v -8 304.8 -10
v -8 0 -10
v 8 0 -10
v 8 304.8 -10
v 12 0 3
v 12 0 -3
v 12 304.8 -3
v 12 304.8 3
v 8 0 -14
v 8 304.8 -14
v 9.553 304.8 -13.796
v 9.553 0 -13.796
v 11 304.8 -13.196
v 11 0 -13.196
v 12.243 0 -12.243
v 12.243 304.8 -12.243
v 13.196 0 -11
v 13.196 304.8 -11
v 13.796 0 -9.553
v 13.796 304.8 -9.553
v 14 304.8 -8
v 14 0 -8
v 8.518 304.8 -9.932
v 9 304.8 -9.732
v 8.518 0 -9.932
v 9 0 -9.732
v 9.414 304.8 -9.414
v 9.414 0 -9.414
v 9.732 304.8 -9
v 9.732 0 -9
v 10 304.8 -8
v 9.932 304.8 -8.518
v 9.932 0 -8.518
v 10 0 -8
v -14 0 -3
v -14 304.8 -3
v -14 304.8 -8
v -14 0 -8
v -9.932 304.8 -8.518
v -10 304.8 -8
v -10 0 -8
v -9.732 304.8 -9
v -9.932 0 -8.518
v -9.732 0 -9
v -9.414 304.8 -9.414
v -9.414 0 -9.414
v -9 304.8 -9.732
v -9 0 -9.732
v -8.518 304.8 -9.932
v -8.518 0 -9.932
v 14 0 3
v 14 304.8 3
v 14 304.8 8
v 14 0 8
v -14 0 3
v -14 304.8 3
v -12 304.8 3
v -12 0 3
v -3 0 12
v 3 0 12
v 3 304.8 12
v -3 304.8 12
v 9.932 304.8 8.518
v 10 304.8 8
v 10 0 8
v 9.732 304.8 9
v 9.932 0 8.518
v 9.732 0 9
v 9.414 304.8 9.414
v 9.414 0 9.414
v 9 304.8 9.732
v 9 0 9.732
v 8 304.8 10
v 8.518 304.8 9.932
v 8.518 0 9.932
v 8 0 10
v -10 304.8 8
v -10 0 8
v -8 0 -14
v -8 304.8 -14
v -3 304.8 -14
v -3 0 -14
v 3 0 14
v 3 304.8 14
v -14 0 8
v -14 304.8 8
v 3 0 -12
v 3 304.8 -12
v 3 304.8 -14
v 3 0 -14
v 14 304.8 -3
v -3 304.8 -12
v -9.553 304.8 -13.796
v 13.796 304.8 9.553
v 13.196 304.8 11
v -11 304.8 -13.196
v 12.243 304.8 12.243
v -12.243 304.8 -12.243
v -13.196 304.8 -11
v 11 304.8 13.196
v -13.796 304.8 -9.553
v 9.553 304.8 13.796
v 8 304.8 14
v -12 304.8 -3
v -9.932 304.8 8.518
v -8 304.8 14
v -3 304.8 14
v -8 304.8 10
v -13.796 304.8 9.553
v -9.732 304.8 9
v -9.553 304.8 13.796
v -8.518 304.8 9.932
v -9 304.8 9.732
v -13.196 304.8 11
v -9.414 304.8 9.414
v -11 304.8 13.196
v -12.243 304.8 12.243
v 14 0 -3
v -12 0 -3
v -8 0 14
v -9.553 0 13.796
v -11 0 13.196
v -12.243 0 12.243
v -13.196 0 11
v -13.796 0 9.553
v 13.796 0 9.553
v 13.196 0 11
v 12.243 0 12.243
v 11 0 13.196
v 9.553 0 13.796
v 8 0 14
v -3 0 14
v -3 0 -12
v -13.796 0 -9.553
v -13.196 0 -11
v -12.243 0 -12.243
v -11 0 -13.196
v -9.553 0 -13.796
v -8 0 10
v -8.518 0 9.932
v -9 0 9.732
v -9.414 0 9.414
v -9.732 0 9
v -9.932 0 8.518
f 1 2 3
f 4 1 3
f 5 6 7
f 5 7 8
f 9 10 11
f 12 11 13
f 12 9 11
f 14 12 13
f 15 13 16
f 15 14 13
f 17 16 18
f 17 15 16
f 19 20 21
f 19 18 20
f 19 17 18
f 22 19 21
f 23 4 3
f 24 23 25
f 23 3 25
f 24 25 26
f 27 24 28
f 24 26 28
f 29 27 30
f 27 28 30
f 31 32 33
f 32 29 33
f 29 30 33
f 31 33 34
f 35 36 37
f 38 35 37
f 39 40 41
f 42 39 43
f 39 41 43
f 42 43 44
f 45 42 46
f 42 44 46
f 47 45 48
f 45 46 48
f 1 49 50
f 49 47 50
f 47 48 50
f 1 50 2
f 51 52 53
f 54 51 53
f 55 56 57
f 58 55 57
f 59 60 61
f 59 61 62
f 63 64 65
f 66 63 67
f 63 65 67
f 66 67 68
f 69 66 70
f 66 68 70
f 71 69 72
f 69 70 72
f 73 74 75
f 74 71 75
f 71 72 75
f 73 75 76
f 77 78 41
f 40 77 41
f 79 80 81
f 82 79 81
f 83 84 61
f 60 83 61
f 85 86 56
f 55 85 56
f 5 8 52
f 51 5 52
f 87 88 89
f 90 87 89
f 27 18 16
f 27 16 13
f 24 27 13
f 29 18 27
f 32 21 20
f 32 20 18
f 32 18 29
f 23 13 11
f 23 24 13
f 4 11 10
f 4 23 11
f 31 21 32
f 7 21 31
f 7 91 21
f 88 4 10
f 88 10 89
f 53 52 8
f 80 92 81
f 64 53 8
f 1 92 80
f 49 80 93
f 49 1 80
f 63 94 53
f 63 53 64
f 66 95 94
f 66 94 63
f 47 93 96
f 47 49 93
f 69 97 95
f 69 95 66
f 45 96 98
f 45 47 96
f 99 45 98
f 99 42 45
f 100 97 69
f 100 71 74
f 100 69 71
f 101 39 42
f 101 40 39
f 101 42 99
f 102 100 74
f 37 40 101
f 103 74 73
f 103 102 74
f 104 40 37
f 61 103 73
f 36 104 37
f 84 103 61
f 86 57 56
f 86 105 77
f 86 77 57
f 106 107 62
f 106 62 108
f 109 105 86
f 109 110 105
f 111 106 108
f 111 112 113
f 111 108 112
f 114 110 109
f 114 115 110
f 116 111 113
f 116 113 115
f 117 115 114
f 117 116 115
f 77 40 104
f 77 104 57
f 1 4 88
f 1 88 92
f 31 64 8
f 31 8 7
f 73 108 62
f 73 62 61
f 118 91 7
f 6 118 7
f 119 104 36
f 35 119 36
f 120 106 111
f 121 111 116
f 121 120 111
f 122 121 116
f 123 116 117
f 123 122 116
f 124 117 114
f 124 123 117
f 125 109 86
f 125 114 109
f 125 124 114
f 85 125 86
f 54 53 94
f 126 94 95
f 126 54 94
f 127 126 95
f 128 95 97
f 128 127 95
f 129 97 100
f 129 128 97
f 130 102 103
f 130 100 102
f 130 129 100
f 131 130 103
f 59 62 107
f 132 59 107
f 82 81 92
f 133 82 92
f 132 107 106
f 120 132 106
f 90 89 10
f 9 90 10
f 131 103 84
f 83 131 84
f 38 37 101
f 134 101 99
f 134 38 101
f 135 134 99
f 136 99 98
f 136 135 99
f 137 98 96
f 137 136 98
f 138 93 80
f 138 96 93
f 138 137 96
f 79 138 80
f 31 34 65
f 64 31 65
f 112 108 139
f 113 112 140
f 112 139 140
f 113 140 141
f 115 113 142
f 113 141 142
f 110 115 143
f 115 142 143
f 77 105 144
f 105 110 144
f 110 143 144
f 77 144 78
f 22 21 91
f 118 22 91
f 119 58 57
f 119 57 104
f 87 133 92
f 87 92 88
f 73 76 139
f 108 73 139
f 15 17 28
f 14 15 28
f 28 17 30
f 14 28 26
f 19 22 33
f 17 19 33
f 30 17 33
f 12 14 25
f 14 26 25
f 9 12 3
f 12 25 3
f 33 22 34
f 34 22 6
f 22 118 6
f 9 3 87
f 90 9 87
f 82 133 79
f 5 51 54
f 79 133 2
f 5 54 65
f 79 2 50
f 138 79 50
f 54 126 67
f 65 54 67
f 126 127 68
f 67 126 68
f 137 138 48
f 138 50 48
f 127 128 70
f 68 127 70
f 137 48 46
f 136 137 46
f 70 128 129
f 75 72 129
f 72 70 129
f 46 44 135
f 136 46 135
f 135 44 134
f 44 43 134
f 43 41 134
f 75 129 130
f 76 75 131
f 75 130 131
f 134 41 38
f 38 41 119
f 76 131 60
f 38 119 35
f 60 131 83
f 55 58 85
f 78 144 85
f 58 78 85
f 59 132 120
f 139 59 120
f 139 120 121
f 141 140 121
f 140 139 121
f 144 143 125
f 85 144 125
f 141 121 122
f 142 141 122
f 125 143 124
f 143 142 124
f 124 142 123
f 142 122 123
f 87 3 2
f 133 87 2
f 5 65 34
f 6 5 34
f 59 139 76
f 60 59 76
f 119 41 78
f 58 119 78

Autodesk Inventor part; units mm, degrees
ref_plane "YZ Plane" through (0, 0, 0) normal (1, 0, 0) x (0, 1, 0)
ref_plane "Start Plane" through (0, 0, 0) normal (0, 1, 0) x (-1, 0, 0)
ref_plane "End Plane" through (0, 304.8, 0) normal (0, 1, 0) x (-1, 0, 0)
sketch "Sketch" plane through (0, 0, 0) normal (0, 1, 0) x (-1, 0, 0)
  line L0 (8, -10) -> (-8, -10)
  line L1 (-10, -8) -> (-10, 8)
  line L2 (-8, 10) -> (8, 10)
  line L3 (10, 8) -> (10, -8)
  line L4 (10, -10) -> (-10, 10) construction
  line L5 (-10, -10) -> (10, 10) construction
  line L6 (14, -14) -> (-14, 14) construction
  line L7 (-14, -14) -> (14, 14) construction
  arc A0 (8, -10) -> (10, -8) centre (8, -8) ccw
  arc A1 (-10, -8) -> (-8, -10) centre (-8, -8) ccw
  arc A2 (-8, 10) -> (-10, 8) centre (-8, 8) ccw
  arc A3 (10, 8) -> (8, 10) centre (8, 8) ccw
  arc A4 (8, -14) -> (14, -8) centre (8, -8) ccw
  arc A5 (-14, -8) -> (-8, -14) centre (-8, -8) ccw
  arc A6 (-8, 14) -> (-14, 8) centre (-8, 8) ccw
  arc A7 (14, 8) -> (8, 14) centre (8, 8) ccw
  line L8 (3, -14) -> (3, -12)
  line L9 (3, -12) -> (-3, -12)
  line L10 (-3, -12) -> (-3, -14)
  line L11 (-14, -3) -> (-12, -3)
  line L12 (-12, -3) -> (-12, 3)
  line L13 (-12, 3) -> (-14, 3)
  line L14 (-3, 14) -> (-3, 12)
  line L15 (-3, 12) -> (3, 12)
  line L16 (3, 12) -> (3, 14)
  line L17 (14, 3) -> (12, 3)
  line L18 (12, 3) -> (12, -3)
  line L19 (12, -3) -> (14, -3)
  line L20 (0, -10) -> (0, -12) construction
  line L21 (-10, 0) -> (-12, 0) construction
  line L22 (0, 10) -> (0, 12) construction
  line L23 (10, 0) -> (12, 0) construction
  line L24 (14, 8) -> (14, 3)
  line L25 (14, -3) -> (14, -8)
  line L26 (8, -14) -> (3, -14)
  line L27 (-3, -14) -> (-8, -14)
  line L28 (-14, -8) -> (-14, -3)
  line L29 (-14, 3) -> (-14, 8)
  line L30 (-8, 14) -> (-3, 14)
  line L31 (3, 14) -> (8, 14)
  point P0 (0, 0)
  dimension "d1" = 20
  dimension "d2" = 2
  dimension "d3" = 6
  dimension "d4" = 20
  dimension "d5" = 6
  dimension "d6" = 2
  dimension "d8" = 28
extrude "Body" add sketch "Sketch" along normal up to surface (304.8 mm away) from surface at 0
sketch "Sketch2" plane through (0, 0, 0) normal (0, 1, 0) x (-1, 0, 0)
  line L0 (0, 0) -> (10, 0)
ref_plane "Work Plane3" through (0, 0, 0) normal (0, 0, -1) x (-1, 0, 0)
sketch "Sketch3" plane through (0, 0, 0) normal (0, 0, -1) x (-1, 0, 0)
  line L0 (-2, 0) -> (12, 0) construction
  line L1 (-2, 304.8) -> (12, 304.8) construction
  dimension "d16" = 304.8
equation "\"G_OFFSET_START\" = 0"
equation "\"G_OFFSET_END\" = 0"
equation "\"d12\" = Length + G_OFFSET_END"
equation "\"G_L\" = d16"
equation "\"Length\" = 304.8"
properties part number "CE-5.2.2-PR" material "Steel, Mild"
